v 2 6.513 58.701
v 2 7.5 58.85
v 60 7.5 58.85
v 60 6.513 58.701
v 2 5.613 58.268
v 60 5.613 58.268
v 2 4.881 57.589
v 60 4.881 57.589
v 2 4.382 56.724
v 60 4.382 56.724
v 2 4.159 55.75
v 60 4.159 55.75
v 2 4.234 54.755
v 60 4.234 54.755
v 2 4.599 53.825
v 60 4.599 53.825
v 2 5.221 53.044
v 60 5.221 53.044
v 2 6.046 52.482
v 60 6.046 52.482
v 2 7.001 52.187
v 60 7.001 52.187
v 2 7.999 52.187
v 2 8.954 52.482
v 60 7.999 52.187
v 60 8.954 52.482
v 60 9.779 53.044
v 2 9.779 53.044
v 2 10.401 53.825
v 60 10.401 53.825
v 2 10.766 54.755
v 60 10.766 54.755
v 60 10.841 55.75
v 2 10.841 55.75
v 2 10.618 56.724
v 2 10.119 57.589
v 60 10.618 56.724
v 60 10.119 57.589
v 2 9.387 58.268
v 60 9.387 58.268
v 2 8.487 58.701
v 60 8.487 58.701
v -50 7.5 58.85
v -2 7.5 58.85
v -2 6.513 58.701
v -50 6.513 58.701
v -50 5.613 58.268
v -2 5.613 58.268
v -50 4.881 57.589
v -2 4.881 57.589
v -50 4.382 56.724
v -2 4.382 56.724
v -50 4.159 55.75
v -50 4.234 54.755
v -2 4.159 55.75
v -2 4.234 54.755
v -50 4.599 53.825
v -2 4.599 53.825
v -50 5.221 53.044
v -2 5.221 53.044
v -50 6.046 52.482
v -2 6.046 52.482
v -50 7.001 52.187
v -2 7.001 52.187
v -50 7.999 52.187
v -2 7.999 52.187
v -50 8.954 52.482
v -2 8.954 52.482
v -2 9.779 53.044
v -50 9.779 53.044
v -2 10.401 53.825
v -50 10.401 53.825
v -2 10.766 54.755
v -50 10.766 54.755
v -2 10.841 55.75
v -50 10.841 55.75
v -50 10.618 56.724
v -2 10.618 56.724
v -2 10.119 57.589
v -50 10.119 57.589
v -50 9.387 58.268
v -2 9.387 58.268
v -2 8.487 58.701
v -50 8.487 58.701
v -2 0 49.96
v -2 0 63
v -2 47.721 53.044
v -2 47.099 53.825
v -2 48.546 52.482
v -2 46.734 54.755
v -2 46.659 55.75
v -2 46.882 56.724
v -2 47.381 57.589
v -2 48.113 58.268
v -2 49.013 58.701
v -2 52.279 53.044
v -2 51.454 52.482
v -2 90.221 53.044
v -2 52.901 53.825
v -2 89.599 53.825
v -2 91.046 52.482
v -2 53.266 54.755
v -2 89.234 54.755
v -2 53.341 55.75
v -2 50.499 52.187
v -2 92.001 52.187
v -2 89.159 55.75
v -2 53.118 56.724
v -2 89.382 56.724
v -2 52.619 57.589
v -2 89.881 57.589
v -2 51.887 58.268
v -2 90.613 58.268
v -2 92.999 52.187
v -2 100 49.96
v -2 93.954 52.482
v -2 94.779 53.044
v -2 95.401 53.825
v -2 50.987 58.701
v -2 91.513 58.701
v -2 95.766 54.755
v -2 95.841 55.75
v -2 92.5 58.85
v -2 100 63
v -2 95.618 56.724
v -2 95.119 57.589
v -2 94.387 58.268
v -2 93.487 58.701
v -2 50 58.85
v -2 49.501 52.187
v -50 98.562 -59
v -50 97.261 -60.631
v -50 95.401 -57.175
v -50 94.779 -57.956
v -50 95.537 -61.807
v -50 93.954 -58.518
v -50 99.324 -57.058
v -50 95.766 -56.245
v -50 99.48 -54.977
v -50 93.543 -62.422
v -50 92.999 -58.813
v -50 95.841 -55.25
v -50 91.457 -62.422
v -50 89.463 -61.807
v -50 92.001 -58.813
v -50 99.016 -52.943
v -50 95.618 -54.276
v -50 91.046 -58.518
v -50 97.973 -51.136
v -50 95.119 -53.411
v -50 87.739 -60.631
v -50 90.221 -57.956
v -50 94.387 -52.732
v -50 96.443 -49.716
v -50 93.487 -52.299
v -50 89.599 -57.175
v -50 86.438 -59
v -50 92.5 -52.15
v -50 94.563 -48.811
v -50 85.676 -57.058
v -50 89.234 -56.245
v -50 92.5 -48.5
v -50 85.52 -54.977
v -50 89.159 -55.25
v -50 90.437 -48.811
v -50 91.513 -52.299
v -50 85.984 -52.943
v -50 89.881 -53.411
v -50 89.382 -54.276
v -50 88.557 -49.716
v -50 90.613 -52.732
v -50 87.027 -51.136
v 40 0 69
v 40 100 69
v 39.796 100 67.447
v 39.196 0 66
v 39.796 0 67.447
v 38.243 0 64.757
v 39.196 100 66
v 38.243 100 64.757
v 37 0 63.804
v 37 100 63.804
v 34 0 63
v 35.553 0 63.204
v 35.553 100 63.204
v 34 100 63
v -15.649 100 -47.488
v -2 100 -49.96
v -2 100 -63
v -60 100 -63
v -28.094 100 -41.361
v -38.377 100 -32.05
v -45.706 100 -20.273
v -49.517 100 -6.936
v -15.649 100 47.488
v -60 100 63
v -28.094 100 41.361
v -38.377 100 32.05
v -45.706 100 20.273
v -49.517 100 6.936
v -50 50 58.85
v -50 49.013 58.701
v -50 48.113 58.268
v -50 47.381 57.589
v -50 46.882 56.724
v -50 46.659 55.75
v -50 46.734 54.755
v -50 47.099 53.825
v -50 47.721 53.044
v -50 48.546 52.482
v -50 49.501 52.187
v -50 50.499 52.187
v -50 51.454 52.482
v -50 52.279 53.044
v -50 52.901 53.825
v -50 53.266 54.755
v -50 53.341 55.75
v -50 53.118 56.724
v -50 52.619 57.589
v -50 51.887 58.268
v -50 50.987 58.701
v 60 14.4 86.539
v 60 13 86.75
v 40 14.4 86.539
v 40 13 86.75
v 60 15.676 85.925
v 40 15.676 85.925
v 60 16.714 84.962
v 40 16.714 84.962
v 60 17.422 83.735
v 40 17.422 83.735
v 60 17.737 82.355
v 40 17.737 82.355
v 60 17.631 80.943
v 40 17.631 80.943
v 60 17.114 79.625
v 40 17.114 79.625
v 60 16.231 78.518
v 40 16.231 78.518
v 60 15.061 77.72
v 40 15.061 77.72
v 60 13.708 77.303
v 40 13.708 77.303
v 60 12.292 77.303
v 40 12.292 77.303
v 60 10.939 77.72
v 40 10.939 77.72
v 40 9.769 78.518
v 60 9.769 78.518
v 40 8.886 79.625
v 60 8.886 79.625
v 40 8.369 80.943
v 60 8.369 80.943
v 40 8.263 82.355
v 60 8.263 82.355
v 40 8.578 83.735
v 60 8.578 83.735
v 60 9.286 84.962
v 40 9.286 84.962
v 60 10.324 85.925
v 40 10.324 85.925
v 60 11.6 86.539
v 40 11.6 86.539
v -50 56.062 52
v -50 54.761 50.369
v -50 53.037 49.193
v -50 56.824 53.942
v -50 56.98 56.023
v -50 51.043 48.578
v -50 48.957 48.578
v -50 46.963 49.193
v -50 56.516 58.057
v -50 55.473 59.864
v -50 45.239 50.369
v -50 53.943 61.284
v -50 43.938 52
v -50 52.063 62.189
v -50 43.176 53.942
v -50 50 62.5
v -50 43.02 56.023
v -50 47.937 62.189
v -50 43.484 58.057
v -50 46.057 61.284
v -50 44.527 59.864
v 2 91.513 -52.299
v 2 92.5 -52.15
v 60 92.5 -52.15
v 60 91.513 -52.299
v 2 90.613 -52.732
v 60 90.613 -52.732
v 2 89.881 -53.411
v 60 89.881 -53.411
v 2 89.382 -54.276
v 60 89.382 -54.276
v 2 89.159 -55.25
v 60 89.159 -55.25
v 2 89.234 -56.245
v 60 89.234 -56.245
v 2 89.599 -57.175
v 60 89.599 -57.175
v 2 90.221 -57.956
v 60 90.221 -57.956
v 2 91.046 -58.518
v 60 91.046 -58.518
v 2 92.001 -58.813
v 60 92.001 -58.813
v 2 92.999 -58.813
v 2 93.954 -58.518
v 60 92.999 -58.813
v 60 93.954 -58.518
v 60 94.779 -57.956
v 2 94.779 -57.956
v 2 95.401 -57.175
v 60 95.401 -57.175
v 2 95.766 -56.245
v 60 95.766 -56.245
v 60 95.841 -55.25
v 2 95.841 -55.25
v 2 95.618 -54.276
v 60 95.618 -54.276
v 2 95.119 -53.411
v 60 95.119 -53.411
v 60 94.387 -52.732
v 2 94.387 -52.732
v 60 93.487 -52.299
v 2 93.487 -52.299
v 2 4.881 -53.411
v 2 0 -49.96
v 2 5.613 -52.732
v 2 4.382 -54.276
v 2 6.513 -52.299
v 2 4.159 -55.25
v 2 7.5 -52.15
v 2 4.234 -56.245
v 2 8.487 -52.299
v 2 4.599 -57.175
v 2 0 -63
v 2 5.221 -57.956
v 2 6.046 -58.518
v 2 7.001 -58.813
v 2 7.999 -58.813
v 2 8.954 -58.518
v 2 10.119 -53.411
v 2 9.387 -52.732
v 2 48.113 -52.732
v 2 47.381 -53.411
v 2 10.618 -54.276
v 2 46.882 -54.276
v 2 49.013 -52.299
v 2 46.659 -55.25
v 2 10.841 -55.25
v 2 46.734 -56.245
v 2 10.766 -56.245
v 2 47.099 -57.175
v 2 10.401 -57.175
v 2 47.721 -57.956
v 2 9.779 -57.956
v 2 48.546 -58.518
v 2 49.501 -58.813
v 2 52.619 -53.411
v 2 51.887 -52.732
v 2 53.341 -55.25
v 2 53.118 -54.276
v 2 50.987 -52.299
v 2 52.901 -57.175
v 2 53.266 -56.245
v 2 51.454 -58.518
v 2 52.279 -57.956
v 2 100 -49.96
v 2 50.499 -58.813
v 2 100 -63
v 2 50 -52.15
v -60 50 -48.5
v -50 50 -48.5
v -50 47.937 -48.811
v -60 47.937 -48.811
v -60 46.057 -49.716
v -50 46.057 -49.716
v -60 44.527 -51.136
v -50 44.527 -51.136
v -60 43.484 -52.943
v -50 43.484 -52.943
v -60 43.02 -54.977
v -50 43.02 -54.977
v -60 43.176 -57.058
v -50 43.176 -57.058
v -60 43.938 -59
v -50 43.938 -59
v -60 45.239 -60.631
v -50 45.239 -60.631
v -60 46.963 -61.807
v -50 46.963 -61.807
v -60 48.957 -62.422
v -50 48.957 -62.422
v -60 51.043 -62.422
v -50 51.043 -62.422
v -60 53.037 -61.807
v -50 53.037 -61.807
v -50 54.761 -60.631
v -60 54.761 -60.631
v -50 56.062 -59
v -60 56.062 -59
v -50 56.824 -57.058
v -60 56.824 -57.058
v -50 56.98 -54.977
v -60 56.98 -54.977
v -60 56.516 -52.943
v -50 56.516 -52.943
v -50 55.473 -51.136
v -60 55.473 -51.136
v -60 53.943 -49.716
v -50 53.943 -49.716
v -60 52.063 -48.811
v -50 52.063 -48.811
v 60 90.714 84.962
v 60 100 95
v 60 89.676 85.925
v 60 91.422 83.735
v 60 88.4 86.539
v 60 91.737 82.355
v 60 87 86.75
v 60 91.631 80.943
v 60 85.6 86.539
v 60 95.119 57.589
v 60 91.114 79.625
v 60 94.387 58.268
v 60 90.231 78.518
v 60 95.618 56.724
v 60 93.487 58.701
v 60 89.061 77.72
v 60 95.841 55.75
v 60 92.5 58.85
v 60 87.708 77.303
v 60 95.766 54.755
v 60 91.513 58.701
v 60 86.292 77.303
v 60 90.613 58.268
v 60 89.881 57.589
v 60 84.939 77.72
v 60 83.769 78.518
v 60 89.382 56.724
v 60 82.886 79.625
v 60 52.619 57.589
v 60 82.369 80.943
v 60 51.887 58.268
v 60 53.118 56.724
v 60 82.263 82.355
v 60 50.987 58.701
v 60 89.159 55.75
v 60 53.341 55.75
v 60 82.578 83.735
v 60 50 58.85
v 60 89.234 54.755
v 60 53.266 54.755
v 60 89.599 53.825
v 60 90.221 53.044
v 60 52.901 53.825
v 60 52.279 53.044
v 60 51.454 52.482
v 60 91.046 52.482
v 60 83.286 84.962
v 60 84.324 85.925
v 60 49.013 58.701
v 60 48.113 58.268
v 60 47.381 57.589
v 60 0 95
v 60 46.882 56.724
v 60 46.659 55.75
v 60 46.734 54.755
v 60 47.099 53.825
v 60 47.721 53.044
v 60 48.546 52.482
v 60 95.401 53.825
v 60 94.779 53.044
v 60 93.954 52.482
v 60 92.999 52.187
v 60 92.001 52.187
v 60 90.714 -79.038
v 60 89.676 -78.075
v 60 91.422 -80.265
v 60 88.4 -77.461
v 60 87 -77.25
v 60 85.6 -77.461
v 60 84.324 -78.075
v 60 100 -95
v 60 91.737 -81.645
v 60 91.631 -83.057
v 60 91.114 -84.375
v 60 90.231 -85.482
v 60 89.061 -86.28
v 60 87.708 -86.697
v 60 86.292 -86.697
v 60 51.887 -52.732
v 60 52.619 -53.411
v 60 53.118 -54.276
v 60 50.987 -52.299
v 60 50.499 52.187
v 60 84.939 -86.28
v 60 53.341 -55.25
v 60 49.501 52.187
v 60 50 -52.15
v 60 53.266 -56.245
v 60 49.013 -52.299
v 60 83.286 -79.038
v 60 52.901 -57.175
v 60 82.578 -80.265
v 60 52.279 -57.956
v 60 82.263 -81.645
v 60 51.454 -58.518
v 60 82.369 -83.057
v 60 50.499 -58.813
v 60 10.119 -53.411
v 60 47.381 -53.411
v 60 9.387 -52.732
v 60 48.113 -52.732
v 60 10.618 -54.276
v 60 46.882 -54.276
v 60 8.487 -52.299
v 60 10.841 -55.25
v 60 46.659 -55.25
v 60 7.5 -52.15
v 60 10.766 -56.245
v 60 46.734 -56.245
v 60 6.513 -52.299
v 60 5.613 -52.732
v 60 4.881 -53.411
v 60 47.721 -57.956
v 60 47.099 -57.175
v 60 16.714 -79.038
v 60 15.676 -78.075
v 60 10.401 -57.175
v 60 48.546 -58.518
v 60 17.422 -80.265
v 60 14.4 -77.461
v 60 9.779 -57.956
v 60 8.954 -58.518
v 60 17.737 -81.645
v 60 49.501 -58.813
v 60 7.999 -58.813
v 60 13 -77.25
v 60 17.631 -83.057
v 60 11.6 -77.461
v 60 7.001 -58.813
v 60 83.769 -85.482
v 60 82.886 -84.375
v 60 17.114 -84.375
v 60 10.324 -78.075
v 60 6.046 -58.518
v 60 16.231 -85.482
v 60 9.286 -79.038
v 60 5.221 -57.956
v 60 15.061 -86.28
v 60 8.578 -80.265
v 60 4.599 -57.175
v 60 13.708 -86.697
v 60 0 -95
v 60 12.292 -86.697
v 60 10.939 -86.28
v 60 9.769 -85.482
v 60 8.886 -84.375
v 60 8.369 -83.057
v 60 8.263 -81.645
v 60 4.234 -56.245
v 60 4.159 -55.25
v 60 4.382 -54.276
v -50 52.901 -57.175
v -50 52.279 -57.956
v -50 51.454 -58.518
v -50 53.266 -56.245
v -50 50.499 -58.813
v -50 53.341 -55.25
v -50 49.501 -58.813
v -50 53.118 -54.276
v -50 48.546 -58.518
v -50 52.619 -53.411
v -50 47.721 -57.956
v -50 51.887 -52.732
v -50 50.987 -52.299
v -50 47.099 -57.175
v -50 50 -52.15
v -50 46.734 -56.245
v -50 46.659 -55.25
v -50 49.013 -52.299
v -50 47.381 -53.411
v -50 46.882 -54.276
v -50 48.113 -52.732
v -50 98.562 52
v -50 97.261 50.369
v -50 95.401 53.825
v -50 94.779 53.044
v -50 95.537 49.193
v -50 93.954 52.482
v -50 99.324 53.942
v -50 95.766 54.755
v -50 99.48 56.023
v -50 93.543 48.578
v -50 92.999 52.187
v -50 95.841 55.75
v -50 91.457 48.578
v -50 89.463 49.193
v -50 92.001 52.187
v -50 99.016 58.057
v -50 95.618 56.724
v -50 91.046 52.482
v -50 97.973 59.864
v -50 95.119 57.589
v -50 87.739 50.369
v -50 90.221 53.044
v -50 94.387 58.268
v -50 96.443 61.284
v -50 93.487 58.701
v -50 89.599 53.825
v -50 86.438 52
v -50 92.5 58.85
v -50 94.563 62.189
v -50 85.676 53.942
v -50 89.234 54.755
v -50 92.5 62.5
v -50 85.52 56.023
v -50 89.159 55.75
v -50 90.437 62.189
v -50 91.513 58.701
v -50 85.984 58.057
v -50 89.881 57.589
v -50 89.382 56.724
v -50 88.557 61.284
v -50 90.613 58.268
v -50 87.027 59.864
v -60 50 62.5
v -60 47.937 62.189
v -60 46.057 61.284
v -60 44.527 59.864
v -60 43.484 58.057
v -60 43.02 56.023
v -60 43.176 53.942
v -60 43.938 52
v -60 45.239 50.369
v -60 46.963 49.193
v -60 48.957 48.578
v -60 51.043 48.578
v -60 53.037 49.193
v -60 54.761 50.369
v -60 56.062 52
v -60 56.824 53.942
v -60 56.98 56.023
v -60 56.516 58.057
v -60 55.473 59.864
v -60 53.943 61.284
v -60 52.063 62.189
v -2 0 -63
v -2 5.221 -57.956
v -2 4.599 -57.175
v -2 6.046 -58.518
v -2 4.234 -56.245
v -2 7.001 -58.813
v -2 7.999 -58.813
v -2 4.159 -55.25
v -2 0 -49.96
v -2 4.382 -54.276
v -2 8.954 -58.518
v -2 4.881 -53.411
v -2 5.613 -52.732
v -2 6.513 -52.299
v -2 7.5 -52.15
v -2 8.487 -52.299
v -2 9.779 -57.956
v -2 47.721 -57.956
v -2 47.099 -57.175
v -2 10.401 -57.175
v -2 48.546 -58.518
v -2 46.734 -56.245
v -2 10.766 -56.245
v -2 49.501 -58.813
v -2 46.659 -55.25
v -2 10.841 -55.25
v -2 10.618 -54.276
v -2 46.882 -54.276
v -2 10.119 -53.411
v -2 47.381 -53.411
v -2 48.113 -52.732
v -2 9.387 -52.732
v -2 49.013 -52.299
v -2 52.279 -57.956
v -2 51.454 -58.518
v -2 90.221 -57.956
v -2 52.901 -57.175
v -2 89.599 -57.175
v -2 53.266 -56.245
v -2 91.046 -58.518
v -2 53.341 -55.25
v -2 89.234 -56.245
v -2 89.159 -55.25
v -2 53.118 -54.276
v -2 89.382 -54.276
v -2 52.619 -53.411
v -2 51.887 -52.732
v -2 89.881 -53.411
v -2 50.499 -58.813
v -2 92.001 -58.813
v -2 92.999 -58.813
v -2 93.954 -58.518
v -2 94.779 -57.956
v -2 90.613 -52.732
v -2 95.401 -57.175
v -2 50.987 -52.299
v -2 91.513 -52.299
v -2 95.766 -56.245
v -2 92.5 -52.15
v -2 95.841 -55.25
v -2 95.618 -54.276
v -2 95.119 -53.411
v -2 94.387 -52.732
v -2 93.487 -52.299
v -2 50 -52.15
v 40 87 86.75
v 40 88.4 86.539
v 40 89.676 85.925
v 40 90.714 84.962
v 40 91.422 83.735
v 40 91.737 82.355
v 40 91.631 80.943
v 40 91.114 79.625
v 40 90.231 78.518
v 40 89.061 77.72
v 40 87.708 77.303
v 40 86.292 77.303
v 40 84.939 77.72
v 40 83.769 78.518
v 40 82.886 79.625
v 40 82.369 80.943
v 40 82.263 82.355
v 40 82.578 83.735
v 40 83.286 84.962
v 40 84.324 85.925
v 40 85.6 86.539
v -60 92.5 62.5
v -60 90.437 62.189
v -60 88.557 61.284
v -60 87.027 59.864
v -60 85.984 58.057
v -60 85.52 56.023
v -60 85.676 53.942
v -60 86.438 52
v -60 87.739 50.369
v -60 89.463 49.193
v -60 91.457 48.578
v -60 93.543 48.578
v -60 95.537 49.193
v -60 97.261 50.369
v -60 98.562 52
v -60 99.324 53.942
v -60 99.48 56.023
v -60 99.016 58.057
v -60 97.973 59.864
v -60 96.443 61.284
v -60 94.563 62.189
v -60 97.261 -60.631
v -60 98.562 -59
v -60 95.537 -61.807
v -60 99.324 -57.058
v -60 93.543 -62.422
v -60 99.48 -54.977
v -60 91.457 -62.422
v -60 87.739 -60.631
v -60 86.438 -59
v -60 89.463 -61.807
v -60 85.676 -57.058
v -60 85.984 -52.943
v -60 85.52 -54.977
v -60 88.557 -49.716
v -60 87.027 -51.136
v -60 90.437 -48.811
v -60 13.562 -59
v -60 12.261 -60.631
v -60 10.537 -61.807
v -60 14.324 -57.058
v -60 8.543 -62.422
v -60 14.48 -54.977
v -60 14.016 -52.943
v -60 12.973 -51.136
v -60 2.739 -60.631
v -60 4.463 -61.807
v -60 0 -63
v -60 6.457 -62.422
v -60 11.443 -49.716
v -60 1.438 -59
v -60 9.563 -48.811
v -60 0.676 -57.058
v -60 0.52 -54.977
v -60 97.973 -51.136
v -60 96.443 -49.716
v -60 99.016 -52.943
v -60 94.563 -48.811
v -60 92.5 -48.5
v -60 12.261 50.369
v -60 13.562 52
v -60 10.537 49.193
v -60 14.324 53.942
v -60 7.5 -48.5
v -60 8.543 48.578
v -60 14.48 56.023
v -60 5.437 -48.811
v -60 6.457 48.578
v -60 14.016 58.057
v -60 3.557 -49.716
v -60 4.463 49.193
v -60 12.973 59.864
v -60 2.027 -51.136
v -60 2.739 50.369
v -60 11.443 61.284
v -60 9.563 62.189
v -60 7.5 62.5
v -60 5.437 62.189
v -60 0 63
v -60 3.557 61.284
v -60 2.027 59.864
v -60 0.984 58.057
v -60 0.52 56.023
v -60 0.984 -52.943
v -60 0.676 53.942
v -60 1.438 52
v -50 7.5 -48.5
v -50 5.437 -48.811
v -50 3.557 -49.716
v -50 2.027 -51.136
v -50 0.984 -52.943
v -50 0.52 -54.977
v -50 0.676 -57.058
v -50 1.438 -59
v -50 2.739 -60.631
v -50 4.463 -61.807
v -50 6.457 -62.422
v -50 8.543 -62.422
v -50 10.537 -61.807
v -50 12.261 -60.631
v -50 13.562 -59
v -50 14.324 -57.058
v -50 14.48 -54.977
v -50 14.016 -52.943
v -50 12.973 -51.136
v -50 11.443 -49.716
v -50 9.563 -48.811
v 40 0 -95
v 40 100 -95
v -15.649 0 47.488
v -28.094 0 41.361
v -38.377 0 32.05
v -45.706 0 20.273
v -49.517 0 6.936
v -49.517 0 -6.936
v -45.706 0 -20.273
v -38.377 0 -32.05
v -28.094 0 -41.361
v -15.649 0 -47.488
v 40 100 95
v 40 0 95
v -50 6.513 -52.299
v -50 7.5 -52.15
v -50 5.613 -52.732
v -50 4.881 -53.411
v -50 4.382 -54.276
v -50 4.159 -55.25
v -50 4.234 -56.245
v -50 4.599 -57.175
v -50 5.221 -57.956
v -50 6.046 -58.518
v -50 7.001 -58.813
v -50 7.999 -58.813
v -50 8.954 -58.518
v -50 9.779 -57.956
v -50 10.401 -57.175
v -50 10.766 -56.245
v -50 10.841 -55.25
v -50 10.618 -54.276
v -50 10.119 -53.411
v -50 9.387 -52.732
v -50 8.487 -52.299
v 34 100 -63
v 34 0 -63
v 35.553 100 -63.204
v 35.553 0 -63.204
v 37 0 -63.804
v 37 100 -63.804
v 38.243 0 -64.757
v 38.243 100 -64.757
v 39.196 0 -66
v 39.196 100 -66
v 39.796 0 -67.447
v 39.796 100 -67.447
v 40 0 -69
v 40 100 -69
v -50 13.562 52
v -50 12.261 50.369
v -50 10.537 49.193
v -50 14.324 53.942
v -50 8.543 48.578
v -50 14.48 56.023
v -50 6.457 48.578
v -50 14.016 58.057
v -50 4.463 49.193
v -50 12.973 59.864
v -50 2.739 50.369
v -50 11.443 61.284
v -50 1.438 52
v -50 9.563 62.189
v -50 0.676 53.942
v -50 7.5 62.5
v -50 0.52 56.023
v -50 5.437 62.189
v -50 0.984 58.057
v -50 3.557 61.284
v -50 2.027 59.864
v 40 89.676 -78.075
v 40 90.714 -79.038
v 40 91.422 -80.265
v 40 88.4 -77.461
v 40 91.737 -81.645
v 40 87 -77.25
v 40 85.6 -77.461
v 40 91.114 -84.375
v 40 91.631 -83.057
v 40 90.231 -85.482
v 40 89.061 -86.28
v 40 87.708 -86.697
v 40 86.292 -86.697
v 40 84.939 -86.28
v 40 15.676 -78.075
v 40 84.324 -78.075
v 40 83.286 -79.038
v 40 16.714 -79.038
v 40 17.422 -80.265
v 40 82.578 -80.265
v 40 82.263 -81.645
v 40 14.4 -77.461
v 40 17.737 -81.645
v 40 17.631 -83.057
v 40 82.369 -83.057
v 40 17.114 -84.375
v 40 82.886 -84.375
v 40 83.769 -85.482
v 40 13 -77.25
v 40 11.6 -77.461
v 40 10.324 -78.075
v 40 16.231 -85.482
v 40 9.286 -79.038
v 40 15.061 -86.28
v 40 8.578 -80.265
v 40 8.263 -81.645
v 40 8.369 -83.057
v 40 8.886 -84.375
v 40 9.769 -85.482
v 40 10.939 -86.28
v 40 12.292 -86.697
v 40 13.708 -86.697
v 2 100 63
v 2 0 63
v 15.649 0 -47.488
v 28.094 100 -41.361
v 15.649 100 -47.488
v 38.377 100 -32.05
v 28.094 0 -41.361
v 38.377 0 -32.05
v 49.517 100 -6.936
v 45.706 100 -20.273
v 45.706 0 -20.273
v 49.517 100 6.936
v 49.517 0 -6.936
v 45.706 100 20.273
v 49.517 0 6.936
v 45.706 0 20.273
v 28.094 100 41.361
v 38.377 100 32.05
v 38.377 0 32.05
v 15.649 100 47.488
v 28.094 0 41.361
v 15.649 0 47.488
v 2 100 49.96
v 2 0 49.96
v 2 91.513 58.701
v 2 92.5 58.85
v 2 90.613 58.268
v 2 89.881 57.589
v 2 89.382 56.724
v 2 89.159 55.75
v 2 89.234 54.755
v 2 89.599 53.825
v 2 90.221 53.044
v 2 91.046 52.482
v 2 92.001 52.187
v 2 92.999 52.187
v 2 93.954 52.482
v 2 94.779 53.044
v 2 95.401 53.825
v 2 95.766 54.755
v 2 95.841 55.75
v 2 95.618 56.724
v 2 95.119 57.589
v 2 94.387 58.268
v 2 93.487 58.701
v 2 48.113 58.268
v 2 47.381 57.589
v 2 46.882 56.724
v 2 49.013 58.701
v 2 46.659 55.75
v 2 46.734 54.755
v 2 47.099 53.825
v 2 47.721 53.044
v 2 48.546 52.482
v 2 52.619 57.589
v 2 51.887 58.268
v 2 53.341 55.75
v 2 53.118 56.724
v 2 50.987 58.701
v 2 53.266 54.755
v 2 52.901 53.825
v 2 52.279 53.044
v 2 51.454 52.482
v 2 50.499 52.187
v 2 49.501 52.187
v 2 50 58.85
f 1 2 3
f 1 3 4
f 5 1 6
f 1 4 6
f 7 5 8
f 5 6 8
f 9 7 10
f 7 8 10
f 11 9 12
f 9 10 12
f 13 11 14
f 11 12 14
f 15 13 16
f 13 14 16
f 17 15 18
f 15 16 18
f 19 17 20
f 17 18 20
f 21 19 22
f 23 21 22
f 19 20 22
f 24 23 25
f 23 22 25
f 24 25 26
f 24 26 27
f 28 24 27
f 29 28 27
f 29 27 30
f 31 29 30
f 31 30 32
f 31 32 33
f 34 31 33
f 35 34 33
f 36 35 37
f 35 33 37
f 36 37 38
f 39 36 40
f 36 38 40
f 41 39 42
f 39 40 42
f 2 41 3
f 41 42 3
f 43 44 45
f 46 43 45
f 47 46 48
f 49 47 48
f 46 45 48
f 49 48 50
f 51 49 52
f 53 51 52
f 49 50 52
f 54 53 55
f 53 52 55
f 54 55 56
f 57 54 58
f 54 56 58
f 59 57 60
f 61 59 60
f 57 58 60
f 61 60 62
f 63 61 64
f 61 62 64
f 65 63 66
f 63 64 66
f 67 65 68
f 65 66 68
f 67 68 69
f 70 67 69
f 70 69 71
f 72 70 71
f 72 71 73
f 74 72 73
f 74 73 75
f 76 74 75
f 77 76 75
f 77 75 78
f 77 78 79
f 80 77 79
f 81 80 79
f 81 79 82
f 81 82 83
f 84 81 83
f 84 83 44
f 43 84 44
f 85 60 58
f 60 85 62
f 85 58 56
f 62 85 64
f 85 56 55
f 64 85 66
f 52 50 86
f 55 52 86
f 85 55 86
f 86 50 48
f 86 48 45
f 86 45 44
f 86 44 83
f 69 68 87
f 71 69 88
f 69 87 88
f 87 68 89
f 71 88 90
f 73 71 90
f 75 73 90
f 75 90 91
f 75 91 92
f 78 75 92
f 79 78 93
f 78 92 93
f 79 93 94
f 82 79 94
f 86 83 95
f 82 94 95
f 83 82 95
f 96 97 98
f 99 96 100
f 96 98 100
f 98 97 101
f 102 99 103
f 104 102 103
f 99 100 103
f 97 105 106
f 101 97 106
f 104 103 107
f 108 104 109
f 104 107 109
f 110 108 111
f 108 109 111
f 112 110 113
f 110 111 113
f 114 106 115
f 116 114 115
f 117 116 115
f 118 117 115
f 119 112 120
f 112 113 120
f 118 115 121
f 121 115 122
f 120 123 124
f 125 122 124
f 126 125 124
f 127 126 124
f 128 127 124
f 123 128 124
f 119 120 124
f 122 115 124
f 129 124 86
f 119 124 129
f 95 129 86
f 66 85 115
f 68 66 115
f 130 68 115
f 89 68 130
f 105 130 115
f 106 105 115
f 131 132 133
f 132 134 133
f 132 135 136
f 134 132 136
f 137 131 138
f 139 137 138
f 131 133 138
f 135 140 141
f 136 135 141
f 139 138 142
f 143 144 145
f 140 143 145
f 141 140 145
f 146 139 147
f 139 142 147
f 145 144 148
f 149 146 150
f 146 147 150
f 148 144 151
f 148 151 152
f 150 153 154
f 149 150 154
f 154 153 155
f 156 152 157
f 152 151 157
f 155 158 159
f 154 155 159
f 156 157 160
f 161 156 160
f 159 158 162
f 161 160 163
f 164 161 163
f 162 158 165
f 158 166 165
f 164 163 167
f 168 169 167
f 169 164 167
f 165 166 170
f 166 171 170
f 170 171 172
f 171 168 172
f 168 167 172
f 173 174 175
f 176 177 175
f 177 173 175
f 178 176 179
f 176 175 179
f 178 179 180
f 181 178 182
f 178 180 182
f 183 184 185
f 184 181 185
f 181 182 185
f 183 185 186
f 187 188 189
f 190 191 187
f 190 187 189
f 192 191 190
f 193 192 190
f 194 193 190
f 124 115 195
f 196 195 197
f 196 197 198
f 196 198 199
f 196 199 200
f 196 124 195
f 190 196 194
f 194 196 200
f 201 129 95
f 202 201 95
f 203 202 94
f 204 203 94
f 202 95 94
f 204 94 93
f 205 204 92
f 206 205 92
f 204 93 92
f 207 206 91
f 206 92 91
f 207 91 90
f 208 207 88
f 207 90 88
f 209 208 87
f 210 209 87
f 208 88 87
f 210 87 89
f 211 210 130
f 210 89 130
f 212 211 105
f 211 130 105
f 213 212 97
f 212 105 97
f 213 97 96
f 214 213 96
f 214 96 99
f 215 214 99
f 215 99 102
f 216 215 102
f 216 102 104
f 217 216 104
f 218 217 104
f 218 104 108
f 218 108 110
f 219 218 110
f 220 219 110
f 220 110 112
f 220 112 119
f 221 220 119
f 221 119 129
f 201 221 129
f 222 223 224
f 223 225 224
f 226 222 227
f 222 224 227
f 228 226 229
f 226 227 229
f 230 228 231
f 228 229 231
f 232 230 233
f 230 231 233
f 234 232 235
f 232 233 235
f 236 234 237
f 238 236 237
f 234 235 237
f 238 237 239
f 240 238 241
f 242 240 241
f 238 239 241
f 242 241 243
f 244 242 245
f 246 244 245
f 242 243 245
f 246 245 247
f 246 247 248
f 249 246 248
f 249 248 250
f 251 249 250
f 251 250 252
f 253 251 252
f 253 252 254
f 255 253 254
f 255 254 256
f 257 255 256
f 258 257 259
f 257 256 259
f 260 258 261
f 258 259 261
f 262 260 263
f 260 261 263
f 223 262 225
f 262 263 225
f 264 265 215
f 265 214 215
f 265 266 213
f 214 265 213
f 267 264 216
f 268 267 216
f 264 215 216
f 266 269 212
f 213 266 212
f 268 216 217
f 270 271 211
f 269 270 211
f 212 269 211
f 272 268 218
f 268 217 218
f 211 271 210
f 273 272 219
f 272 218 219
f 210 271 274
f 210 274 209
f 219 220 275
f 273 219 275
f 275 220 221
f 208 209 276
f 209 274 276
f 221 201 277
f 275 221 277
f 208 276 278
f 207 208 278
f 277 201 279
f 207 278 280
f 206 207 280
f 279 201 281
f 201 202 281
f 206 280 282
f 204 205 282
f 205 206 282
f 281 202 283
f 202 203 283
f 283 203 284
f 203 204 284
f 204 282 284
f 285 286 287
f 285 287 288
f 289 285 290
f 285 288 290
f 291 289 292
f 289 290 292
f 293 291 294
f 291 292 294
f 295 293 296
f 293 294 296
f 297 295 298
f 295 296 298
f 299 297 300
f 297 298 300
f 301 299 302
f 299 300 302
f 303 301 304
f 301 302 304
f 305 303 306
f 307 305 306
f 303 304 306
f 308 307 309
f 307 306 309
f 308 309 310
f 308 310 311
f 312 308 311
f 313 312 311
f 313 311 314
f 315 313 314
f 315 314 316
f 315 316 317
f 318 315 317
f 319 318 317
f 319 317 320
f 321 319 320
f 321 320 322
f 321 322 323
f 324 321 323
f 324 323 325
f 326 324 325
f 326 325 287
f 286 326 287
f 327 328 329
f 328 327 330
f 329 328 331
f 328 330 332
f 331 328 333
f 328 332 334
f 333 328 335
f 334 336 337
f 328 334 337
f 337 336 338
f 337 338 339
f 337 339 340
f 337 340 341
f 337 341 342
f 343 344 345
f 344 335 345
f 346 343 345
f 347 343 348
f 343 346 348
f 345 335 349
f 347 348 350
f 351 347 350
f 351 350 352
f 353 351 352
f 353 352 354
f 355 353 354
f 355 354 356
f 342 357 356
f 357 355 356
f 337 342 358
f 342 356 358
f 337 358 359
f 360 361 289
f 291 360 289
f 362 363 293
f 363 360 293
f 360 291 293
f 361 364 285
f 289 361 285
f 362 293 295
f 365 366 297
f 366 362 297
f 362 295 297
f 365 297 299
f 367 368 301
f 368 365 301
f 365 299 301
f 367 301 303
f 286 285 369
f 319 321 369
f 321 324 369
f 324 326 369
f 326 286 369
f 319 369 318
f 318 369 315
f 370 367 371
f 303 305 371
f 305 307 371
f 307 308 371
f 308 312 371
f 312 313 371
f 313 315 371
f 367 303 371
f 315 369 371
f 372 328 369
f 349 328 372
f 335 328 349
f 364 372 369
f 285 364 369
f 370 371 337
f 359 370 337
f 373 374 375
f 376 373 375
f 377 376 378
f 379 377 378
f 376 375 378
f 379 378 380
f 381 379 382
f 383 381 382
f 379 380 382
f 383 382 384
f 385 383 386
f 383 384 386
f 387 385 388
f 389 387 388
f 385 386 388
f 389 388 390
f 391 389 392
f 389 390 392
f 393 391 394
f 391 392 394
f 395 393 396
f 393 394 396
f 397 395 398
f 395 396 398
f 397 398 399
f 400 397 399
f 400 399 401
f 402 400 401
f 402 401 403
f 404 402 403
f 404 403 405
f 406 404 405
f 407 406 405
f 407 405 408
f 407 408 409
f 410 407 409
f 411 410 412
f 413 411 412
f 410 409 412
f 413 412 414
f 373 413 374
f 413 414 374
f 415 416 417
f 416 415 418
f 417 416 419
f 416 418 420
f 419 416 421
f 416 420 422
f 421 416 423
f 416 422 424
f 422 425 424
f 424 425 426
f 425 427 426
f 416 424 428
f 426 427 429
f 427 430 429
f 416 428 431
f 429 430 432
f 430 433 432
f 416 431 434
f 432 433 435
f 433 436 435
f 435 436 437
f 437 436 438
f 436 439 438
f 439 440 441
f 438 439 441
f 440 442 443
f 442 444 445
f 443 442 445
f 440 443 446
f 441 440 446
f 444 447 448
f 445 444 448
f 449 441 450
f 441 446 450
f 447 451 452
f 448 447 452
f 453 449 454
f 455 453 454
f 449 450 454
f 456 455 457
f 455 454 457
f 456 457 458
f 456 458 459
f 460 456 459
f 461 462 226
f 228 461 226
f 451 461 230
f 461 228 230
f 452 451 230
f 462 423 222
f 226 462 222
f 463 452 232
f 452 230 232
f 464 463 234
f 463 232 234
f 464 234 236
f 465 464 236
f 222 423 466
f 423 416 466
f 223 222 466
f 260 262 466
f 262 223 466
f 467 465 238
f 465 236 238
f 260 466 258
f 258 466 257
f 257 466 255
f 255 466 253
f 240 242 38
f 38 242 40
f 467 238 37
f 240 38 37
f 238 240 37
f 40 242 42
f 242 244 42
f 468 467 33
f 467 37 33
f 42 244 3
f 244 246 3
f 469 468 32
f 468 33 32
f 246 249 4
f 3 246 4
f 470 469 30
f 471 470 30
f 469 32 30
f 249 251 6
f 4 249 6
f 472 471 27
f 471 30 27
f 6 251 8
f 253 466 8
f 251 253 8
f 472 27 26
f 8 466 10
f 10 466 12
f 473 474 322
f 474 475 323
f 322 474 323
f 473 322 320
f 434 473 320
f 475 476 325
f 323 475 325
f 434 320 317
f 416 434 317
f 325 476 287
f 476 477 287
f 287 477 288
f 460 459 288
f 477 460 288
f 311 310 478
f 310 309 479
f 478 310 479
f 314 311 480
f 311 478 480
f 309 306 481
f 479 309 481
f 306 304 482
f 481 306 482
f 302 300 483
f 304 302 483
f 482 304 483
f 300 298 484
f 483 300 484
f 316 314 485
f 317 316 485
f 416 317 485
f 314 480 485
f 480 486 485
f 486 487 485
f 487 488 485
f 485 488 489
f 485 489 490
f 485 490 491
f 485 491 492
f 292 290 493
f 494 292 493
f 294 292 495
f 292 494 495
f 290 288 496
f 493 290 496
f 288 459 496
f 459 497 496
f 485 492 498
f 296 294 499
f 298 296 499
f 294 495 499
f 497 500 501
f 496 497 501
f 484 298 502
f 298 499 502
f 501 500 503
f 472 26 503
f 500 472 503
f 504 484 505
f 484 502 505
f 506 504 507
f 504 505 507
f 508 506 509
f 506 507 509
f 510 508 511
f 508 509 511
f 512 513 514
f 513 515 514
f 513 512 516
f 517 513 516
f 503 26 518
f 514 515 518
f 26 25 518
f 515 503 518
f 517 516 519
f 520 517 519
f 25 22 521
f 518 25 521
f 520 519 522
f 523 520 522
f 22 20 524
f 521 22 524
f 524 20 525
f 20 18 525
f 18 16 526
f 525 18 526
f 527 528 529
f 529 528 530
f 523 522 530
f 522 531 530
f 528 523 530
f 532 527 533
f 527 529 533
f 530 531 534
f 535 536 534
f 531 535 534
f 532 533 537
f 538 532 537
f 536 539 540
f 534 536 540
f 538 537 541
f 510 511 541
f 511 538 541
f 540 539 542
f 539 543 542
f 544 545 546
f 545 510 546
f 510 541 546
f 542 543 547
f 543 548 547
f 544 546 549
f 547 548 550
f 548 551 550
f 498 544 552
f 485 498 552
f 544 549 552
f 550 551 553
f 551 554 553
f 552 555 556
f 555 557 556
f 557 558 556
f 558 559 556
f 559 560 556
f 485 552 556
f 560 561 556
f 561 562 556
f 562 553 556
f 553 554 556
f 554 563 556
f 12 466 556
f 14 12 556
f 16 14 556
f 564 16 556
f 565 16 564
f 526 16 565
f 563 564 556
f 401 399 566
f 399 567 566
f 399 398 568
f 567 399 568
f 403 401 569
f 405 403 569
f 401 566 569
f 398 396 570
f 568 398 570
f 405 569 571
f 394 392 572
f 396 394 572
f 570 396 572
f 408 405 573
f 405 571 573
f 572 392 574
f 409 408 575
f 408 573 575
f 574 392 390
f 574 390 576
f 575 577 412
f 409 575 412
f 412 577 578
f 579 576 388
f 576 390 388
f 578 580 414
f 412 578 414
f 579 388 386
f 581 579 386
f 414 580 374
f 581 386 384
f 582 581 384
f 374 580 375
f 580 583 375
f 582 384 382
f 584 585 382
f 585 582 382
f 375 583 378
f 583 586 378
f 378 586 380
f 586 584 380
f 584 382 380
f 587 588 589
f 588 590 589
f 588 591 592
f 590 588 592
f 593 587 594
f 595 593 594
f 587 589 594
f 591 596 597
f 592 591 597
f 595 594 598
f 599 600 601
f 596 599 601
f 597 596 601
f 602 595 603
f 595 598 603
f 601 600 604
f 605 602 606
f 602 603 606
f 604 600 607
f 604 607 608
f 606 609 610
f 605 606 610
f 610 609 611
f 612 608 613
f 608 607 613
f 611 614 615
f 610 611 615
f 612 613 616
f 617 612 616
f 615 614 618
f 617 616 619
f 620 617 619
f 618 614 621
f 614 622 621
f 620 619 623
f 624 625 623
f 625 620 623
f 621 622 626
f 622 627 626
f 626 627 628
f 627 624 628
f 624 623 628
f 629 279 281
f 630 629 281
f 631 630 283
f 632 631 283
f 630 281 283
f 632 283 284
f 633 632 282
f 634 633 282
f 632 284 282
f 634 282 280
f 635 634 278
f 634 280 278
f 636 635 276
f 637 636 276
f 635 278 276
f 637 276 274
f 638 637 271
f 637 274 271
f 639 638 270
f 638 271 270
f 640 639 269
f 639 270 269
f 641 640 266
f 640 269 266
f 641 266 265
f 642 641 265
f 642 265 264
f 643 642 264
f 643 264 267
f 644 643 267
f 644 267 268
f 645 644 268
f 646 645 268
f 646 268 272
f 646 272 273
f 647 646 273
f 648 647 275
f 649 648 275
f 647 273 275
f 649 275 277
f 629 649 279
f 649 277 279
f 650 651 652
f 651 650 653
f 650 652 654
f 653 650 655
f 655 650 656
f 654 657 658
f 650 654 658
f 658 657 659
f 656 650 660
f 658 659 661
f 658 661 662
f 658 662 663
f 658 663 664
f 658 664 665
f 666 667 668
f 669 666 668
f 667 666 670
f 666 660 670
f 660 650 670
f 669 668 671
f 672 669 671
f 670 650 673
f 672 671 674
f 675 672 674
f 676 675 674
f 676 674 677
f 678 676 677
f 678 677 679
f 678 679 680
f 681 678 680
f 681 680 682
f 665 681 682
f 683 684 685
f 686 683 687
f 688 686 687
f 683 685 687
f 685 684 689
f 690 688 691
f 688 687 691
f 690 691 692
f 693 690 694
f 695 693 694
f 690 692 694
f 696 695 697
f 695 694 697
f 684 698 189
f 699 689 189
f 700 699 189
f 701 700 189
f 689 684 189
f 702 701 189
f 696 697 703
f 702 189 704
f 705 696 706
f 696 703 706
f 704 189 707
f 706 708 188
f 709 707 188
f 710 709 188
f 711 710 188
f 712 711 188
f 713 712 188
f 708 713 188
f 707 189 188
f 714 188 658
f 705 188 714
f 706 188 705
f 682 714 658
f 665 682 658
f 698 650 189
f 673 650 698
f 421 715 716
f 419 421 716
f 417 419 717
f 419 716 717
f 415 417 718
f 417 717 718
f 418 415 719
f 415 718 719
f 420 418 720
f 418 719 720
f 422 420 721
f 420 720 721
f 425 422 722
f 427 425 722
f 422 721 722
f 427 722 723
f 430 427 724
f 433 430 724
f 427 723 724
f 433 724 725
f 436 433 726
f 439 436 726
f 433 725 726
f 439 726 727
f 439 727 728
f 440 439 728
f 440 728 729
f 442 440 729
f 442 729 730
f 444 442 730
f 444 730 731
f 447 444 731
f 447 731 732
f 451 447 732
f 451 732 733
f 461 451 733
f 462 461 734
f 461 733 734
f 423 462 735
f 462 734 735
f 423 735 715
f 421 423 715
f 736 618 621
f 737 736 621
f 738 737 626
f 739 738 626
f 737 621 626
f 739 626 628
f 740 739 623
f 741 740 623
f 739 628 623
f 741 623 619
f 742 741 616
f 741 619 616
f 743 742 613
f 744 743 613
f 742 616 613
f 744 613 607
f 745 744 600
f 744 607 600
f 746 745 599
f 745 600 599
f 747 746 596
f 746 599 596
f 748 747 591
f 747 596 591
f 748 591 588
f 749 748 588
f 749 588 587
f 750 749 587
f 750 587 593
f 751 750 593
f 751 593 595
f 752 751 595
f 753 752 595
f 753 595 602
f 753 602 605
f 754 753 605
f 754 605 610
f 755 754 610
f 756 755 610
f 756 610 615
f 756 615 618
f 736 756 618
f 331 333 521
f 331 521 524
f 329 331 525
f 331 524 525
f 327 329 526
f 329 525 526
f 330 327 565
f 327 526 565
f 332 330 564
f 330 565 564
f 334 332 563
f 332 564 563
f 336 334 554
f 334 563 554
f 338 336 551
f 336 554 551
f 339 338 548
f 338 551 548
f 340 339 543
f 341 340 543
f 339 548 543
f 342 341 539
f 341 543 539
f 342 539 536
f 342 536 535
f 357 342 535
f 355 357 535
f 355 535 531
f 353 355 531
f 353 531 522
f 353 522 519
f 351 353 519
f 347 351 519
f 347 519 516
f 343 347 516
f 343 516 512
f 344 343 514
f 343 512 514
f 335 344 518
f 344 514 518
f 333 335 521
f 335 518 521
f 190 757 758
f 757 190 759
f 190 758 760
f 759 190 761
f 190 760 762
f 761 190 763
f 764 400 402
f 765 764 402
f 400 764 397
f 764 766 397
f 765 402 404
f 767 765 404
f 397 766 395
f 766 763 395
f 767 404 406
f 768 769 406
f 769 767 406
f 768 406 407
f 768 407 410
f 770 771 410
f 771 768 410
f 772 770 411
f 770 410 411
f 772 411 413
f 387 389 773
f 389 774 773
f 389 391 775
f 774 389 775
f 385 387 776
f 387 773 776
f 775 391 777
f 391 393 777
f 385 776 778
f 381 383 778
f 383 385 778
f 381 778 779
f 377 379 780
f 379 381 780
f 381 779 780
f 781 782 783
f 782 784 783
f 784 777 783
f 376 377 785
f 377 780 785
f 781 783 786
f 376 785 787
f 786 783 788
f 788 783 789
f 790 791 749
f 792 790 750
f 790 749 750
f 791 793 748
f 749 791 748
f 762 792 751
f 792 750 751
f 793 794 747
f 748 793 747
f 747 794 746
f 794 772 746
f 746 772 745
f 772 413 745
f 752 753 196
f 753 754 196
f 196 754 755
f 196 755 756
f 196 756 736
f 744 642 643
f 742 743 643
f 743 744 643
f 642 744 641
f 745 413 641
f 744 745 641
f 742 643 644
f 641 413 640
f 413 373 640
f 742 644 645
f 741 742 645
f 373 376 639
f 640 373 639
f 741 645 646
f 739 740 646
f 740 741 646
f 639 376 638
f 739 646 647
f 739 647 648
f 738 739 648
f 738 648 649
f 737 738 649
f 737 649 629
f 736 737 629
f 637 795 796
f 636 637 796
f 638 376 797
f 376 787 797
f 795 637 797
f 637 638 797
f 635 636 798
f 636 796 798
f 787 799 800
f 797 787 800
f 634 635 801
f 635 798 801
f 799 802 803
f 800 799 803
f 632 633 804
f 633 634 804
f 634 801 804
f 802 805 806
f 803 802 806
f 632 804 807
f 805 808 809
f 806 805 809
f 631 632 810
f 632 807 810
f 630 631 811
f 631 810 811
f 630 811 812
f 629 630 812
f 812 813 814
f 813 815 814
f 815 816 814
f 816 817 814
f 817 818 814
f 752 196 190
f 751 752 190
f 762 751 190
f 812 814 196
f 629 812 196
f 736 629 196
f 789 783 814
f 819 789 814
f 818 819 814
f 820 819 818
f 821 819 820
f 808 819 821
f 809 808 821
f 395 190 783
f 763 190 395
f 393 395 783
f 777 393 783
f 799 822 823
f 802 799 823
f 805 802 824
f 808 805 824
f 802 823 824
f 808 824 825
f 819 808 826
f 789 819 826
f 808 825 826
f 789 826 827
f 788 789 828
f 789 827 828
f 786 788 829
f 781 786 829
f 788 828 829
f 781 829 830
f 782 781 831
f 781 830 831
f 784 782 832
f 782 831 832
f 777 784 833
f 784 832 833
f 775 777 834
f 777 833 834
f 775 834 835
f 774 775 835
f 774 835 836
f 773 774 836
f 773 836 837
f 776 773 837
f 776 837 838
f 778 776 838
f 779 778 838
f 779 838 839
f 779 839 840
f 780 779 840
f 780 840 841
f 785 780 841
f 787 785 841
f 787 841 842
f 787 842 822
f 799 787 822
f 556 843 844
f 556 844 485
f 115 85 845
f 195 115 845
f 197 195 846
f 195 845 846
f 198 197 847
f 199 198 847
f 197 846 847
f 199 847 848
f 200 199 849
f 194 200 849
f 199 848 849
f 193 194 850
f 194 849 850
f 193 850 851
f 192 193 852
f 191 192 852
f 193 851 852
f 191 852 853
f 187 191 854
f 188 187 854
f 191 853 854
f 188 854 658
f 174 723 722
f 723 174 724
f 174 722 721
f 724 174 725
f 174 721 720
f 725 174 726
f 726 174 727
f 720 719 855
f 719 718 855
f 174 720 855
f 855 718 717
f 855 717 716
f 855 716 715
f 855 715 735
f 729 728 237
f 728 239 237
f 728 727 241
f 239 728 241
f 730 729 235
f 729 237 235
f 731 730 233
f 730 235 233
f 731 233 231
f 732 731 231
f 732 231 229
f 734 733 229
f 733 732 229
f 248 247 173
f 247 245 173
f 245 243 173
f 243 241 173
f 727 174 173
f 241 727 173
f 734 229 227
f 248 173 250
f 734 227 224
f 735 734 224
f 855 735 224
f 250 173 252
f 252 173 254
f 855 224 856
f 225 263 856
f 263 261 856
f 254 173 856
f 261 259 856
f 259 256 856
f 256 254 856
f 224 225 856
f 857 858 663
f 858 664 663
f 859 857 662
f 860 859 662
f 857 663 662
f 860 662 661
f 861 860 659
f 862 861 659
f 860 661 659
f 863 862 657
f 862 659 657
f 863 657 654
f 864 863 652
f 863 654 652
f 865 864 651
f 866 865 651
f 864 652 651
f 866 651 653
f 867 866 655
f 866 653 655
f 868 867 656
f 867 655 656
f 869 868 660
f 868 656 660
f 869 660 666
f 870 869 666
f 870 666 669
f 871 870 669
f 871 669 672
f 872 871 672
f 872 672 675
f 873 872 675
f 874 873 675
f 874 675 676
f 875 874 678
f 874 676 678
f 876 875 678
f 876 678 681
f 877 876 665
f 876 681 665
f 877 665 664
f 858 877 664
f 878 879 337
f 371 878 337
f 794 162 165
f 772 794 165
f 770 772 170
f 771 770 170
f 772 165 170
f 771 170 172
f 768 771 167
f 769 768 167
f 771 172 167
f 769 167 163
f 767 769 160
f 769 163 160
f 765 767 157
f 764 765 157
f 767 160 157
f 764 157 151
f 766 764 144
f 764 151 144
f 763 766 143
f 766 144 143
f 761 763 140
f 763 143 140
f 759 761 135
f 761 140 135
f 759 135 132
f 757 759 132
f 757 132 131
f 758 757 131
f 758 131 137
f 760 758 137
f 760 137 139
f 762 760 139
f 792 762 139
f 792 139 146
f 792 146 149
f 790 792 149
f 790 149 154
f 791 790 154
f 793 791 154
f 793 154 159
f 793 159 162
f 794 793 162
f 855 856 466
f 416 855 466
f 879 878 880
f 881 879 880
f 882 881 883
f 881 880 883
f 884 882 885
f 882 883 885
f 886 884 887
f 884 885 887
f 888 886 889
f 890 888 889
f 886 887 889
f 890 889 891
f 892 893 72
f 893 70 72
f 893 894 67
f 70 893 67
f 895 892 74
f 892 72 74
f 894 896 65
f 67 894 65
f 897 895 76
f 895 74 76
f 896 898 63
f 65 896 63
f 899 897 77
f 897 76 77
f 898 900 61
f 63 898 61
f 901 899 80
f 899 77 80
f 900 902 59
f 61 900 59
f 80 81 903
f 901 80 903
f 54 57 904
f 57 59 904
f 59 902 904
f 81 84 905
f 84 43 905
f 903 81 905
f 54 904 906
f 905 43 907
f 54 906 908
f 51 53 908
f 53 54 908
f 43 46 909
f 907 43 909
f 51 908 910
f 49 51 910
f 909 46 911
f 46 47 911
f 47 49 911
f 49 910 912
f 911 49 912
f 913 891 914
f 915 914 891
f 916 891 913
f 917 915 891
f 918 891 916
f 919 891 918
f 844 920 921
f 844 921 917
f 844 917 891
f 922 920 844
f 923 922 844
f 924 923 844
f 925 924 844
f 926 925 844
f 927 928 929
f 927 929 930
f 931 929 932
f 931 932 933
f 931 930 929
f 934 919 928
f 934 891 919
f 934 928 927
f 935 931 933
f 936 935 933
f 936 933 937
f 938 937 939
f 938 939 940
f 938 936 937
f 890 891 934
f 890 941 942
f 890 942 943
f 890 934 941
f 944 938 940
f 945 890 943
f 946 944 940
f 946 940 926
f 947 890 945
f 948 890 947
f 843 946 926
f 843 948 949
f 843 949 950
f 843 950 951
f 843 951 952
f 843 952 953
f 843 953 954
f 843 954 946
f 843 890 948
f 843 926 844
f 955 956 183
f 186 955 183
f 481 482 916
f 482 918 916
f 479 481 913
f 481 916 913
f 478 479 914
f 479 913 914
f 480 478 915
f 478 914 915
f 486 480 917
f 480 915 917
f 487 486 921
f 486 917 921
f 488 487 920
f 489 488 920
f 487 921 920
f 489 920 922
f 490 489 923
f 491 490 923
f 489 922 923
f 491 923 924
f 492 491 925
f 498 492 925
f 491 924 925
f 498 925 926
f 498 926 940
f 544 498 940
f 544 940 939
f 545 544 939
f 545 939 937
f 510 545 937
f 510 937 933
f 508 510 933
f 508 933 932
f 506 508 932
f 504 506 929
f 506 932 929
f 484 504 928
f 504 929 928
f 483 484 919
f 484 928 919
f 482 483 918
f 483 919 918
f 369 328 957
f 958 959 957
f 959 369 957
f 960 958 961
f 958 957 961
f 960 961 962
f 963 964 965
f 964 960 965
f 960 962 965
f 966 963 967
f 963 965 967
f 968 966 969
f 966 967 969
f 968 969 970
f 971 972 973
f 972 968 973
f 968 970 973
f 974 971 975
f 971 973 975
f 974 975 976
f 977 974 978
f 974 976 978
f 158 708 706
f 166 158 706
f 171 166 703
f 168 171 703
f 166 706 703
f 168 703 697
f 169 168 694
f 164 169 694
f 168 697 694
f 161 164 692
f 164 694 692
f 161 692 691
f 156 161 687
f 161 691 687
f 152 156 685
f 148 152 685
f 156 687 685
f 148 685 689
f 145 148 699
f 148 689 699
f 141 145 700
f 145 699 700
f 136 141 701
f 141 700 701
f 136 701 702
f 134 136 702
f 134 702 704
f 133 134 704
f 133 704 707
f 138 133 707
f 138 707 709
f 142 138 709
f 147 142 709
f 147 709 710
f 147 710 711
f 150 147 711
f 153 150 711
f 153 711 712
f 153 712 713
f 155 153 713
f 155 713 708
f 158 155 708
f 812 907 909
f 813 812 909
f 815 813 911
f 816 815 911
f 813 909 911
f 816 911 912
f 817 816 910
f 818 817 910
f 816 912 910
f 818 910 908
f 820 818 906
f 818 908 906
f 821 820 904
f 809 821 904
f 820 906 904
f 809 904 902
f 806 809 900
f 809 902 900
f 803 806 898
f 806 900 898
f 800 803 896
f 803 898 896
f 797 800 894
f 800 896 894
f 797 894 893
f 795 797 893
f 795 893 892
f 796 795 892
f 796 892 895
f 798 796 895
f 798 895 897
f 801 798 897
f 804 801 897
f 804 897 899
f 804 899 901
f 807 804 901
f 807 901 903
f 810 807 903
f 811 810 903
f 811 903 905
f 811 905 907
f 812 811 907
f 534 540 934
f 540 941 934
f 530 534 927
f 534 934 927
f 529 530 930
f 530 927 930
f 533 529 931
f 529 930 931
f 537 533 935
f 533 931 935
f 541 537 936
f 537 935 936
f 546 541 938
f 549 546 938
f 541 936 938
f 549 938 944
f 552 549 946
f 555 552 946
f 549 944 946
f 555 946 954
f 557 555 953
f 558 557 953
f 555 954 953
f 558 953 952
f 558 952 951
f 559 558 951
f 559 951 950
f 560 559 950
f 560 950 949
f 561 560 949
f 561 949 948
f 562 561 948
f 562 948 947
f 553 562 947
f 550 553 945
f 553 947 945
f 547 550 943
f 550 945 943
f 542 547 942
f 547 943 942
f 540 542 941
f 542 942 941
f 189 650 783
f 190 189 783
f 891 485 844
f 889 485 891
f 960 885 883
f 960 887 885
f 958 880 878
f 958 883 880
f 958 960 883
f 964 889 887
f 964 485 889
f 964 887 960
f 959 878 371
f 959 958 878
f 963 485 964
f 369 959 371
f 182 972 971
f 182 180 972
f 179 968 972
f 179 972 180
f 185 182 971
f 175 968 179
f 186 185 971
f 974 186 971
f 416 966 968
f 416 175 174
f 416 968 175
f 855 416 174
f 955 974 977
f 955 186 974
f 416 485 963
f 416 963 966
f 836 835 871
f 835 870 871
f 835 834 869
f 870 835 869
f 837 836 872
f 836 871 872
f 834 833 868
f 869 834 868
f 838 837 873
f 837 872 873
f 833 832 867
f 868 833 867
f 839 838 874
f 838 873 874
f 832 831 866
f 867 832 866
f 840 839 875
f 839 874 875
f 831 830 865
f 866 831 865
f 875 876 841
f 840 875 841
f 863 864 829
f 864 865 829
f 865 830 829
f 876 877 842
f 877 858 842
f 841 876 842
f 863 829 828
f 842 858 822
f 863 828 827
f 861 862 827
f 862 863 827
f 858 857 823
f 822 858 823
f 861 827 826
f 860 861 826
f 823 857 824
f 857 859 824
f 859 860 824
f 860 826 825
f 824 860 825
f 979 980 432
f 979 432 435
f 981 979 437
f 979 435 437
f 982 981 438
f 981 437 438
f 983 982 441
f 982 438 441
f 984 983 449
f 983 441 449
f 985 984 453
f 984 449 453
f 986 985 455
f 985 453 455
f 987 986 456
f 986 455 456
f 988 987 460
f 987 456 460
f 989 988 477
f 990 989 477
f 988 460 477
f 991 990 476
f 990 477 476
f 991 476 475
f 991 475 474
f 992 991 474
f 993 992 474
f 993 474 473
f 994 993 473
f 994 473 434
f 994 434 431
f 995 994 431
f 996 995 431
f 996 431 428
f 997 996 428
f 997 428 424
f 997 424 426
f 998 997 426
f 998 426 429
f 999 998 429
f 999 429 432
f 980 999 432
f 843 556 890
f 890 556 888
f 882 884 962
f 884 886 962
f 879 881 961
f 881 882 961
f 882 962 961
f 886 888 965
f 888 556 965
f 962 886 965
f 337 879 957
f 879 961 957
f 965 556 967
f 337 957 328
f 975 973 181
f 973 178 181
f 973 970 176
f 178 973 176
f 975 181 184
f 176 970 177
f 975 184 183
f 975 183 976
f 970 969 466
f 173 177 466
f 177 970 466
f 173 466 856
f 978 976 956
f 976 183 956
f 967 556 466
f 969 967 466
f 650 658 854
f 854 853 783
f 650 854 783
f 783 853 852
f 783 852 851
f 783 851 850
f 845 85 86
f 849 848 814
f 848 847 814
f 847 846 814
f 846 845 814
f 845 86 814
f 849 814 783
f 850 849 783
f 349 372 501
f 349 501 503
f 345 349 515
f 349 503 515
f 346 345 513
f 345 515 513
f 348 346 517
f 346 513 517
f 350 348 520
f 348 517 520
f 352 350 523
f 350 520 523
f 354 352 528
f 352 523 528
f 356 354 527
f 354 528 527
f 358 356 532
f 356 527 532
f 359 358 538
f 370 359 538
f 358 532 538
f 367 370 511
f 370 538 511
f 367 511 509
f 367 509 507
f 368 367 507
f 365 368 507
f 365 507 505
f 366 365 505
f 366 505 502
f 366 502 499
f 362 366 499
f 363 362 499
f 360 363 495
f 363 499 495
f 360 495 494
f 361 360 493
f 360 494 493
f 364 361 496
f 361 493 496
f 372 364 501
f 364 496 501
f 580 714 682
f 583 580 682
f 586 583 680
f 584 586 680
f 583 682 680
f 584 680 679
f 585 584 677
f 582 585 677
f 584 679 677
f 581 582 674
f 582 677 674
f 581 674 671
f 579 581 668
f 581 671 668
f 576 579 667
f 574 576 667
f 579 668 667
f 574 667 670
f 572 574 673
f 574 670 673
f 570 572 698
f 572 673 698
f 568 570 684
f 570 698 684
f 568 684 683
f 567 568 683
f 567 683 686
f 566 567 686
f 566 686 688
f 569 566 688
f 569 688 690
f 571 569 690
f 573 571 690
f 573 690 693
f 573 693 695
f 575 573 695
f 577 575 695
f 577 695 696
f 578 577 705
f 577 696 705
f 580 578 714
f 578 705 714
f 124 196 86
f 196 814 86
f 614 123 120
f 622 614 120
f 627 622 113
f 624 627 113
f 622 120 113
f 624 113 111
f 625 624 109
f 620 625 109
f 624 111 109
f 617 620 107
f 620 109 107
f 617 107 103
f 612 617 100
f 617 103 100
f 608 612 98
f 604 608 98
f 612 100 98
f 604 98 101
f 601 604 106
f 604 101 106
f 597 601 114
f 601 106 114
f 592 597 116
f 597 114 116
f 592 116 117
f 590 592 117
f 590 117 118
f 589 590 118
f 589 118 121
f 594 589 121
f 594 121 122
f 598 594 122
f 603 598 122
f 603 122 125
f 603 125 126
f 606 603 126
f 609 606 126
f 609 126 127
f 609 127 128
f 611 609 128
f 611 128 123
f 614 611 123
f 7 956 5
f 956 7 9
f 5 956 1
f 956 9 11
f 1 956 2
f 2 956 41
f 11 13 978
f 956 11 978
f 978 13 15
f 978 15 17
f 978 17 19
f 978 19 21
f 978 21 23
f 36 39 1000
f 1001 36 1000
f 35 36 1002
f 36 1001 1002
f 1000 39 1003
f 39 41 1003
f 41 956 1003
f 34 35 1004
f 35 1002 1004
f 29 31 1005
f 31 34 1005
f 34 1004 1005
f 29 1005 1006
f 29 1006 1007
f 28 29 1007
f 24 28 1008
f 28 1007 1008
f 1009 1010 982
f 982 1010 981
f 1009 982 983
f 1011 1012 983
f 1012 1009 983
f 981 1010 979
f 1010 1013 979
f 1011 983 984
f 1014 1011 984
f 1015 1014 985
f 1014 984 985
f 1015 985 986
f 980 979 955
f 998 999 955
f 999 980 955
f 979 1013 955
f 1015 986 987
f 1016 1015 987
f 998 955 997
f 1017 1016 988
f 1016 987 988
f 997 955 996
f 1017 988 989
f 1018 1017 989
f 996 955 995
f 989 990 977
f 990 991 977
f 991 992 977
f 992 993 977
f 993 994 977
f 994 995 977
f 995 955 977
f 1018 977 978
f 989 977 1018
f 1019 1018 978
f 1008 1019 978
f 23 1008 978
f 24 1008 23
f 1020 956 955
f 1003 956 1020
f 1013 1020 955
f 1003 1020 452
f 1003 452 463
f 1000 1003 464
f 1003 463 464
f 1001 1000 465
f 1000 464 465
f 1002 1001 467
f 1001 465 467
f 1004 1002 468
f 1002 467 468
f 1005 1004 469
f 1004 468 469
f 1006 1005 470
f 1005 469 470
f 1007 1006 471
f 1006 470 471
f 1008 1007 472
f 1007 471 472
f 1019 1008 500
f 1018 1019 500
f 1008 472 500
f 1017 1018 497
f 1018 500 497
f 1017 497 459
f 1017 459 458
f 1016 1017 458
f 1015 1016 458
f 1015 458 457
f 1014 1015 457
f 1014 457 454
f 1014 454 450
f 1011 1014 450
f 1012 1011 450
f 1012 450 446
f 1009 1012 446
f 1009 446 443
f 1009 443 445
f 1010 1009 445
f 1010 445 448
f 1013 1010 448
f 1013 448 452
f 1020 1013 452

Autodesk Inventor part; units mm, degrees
ref_plane "YZ Plane" through (0, 0, 0) normal (1, 0, 0) x (0, 1, 0)
ref_plane "XZ Plane" through (0, 0, 0) normal (0, 1, 0) x (-1, 0, 0)
ref_plane "XY Plane" through (0, 0, 0) normal (0, 0, 1) x (1, 0, 0)
sketch "Эскиз1" plane through (0, 0, 0) normal (0, 1, 0) x (-1, 0, 0)
  circle A0 centre (0, 0) radius 50
  line L0 (60, 63) -> (-60, 63)
  line L1 (-60, 63) -> (-60, -63)
  line L2 (-60, -63) -> (60, -63)
  line L3 (60, -63) -> (60, 63)
  line L4 (-60, -63) -> (-40, -63)
  line L5 (-40, -63) -> (-40, -95)
  line L6 (-40, -95) -> (-60, -95)
  line L7 (-60, -95) -> (-60, -63)
  line L8 (-60, 63) -> (-40, 63)
  line L9 (-40, 63) -> (-40, 95)
  line L10 (-40, 95) -> (-60, 95)
  line L11 (-60, 95) -> (-60, 63)
  point P0 (-40, 63)
  dimension "d0" = 100
  dimension "d1" = 32
  dimension "d2" = 32
  dimension "d3" = 20
  dimension "d4" = 20
  dimension "d5" = 120
  dimension "d6" = 126
  dimension "d7" = 63
  dimension "d8" = 63
extrude "Выдавливание1" add sketch "Эскиз1" along normal blind 100
sketch "Эскиз2" plane through (0, 100, 0) normal (0, 1, 0) x (1, 0, 0)
  point P0 (0, 0)
fillet "Сопряжение1" radius 6 2 edges at (40, 50, 63) (40, 50, -63)
sketch "Эскиз3" plane through (40, 0, 95) normal (-1, 0, 0) x (0, 0, 1)
  line L0 (-164, 100) -> (-164, 0) projected
  line L1 (-190, 100) -> (-164, 100) projected
  line L2 (-190, 0) -> (-190, 100) projected
  line L3 (-190, 0) -> (-164, 0) projected
  line L4 (-26, 0) -> (-26, 100) projected
  line L5 (-26, 0) -> (0, 0) projected
  line L6 (0, 0) -> (0, 100) projected
  line L7 (-26, 100) -> (0, 100) projected
  line L8 (-177, 87) -> (-177, 87)
  line L9 (-177, 87) -> (-177, 13)
  line L10 (-177, 13) -> (-177, 13)
  line L11 (-177, 13) -> (-177, 87)
  line L12 (-13, 87) -> (-13, 13)
  line L13 (-13, 13) -> (-13, 13)
  line L14 (-13, 13) -> (-13, 87)
  line L15 (-13, 87) -> (-13, 87)
  circle A0 centre (-13, 87) radius 4.75
  circle A1 centre (-13, 13) radius 4.75
  circle A2 centre (-177, 87) radius 4.75
  circle A3 centre (-177, 13) radius 4.75
  point P0 (-95, 0)
  dimension "d12" = 13
  dimension "d13" = 13
extrude "Выдавливание2" cut sketch "Эскиз3" against normal blind 25 contours A3 | A2 | A1 | A0
sketch "Эскиз4" plane through (-60, 0, -63) normal (-1, 0, 0) x (0, 0, 1)
  line L0 (0, 0) -> (126, 0) projected
  line L1 (126, 0) -> (126, 100) projected
  line L2 (0, 100) -> (126, 100) projected
  line L3 (0, 0) -> (0, 100) projected
  line L4 (7.5, 92.5) -> (118.5, 92.5)
  line L5 (118.5, 92.5) -> (118.5, 7.5)
  line L6 (118.5, 7.5) -> (7.5, 7.5)
  line L7 (7.5, 7.5) -> (7.5, 92.5)
  circle A0 centre (7.5, 7.5) radius 3.5
  circle A1 centre (7.5, 92.5) radius 3.5
  circle A2 centre (118.5, 92.5) radius 3.5
  circle A3 centre (118.5, 7.5) radius 3.5
  circle A4 centre (118.5, 50) radius 3.5
  circle A5 centre (7.5, 50) radius 3.5
  point P0 (63, 0)
  dimension "d16" = 7.5
hole "Отверстие1" at (-60, 7.5, -55.5) at (-60, 50, -55.5) at (-60, 92.5, -55.5) at (-60, 92.5, 55.5) at (-60, 50, 55.5) at (-60, 7.5, 55.5) direction (1, 0, 0) diameter 6.7 end through all counterbore diameter 14 counterbore depth 10
sketch "Эскиз5" plane through (0, 100, 0) normal (0, 1, 0) x (1, 0, 0)
  line L0 (-2, -66) -> (2, -66)
  line L1 (2, -66) -> (2, 67)
  line L2 (2, 67) -> (-2, 67)
  line L3 (-2, 67) -> (-2, -66)
  point P0 (0, 0)
extrude "Выдавливание3" cut sketch "Эскиз5" against normal blind 200
properties part number "Spindel100mm" material "Алюминий 6061"
